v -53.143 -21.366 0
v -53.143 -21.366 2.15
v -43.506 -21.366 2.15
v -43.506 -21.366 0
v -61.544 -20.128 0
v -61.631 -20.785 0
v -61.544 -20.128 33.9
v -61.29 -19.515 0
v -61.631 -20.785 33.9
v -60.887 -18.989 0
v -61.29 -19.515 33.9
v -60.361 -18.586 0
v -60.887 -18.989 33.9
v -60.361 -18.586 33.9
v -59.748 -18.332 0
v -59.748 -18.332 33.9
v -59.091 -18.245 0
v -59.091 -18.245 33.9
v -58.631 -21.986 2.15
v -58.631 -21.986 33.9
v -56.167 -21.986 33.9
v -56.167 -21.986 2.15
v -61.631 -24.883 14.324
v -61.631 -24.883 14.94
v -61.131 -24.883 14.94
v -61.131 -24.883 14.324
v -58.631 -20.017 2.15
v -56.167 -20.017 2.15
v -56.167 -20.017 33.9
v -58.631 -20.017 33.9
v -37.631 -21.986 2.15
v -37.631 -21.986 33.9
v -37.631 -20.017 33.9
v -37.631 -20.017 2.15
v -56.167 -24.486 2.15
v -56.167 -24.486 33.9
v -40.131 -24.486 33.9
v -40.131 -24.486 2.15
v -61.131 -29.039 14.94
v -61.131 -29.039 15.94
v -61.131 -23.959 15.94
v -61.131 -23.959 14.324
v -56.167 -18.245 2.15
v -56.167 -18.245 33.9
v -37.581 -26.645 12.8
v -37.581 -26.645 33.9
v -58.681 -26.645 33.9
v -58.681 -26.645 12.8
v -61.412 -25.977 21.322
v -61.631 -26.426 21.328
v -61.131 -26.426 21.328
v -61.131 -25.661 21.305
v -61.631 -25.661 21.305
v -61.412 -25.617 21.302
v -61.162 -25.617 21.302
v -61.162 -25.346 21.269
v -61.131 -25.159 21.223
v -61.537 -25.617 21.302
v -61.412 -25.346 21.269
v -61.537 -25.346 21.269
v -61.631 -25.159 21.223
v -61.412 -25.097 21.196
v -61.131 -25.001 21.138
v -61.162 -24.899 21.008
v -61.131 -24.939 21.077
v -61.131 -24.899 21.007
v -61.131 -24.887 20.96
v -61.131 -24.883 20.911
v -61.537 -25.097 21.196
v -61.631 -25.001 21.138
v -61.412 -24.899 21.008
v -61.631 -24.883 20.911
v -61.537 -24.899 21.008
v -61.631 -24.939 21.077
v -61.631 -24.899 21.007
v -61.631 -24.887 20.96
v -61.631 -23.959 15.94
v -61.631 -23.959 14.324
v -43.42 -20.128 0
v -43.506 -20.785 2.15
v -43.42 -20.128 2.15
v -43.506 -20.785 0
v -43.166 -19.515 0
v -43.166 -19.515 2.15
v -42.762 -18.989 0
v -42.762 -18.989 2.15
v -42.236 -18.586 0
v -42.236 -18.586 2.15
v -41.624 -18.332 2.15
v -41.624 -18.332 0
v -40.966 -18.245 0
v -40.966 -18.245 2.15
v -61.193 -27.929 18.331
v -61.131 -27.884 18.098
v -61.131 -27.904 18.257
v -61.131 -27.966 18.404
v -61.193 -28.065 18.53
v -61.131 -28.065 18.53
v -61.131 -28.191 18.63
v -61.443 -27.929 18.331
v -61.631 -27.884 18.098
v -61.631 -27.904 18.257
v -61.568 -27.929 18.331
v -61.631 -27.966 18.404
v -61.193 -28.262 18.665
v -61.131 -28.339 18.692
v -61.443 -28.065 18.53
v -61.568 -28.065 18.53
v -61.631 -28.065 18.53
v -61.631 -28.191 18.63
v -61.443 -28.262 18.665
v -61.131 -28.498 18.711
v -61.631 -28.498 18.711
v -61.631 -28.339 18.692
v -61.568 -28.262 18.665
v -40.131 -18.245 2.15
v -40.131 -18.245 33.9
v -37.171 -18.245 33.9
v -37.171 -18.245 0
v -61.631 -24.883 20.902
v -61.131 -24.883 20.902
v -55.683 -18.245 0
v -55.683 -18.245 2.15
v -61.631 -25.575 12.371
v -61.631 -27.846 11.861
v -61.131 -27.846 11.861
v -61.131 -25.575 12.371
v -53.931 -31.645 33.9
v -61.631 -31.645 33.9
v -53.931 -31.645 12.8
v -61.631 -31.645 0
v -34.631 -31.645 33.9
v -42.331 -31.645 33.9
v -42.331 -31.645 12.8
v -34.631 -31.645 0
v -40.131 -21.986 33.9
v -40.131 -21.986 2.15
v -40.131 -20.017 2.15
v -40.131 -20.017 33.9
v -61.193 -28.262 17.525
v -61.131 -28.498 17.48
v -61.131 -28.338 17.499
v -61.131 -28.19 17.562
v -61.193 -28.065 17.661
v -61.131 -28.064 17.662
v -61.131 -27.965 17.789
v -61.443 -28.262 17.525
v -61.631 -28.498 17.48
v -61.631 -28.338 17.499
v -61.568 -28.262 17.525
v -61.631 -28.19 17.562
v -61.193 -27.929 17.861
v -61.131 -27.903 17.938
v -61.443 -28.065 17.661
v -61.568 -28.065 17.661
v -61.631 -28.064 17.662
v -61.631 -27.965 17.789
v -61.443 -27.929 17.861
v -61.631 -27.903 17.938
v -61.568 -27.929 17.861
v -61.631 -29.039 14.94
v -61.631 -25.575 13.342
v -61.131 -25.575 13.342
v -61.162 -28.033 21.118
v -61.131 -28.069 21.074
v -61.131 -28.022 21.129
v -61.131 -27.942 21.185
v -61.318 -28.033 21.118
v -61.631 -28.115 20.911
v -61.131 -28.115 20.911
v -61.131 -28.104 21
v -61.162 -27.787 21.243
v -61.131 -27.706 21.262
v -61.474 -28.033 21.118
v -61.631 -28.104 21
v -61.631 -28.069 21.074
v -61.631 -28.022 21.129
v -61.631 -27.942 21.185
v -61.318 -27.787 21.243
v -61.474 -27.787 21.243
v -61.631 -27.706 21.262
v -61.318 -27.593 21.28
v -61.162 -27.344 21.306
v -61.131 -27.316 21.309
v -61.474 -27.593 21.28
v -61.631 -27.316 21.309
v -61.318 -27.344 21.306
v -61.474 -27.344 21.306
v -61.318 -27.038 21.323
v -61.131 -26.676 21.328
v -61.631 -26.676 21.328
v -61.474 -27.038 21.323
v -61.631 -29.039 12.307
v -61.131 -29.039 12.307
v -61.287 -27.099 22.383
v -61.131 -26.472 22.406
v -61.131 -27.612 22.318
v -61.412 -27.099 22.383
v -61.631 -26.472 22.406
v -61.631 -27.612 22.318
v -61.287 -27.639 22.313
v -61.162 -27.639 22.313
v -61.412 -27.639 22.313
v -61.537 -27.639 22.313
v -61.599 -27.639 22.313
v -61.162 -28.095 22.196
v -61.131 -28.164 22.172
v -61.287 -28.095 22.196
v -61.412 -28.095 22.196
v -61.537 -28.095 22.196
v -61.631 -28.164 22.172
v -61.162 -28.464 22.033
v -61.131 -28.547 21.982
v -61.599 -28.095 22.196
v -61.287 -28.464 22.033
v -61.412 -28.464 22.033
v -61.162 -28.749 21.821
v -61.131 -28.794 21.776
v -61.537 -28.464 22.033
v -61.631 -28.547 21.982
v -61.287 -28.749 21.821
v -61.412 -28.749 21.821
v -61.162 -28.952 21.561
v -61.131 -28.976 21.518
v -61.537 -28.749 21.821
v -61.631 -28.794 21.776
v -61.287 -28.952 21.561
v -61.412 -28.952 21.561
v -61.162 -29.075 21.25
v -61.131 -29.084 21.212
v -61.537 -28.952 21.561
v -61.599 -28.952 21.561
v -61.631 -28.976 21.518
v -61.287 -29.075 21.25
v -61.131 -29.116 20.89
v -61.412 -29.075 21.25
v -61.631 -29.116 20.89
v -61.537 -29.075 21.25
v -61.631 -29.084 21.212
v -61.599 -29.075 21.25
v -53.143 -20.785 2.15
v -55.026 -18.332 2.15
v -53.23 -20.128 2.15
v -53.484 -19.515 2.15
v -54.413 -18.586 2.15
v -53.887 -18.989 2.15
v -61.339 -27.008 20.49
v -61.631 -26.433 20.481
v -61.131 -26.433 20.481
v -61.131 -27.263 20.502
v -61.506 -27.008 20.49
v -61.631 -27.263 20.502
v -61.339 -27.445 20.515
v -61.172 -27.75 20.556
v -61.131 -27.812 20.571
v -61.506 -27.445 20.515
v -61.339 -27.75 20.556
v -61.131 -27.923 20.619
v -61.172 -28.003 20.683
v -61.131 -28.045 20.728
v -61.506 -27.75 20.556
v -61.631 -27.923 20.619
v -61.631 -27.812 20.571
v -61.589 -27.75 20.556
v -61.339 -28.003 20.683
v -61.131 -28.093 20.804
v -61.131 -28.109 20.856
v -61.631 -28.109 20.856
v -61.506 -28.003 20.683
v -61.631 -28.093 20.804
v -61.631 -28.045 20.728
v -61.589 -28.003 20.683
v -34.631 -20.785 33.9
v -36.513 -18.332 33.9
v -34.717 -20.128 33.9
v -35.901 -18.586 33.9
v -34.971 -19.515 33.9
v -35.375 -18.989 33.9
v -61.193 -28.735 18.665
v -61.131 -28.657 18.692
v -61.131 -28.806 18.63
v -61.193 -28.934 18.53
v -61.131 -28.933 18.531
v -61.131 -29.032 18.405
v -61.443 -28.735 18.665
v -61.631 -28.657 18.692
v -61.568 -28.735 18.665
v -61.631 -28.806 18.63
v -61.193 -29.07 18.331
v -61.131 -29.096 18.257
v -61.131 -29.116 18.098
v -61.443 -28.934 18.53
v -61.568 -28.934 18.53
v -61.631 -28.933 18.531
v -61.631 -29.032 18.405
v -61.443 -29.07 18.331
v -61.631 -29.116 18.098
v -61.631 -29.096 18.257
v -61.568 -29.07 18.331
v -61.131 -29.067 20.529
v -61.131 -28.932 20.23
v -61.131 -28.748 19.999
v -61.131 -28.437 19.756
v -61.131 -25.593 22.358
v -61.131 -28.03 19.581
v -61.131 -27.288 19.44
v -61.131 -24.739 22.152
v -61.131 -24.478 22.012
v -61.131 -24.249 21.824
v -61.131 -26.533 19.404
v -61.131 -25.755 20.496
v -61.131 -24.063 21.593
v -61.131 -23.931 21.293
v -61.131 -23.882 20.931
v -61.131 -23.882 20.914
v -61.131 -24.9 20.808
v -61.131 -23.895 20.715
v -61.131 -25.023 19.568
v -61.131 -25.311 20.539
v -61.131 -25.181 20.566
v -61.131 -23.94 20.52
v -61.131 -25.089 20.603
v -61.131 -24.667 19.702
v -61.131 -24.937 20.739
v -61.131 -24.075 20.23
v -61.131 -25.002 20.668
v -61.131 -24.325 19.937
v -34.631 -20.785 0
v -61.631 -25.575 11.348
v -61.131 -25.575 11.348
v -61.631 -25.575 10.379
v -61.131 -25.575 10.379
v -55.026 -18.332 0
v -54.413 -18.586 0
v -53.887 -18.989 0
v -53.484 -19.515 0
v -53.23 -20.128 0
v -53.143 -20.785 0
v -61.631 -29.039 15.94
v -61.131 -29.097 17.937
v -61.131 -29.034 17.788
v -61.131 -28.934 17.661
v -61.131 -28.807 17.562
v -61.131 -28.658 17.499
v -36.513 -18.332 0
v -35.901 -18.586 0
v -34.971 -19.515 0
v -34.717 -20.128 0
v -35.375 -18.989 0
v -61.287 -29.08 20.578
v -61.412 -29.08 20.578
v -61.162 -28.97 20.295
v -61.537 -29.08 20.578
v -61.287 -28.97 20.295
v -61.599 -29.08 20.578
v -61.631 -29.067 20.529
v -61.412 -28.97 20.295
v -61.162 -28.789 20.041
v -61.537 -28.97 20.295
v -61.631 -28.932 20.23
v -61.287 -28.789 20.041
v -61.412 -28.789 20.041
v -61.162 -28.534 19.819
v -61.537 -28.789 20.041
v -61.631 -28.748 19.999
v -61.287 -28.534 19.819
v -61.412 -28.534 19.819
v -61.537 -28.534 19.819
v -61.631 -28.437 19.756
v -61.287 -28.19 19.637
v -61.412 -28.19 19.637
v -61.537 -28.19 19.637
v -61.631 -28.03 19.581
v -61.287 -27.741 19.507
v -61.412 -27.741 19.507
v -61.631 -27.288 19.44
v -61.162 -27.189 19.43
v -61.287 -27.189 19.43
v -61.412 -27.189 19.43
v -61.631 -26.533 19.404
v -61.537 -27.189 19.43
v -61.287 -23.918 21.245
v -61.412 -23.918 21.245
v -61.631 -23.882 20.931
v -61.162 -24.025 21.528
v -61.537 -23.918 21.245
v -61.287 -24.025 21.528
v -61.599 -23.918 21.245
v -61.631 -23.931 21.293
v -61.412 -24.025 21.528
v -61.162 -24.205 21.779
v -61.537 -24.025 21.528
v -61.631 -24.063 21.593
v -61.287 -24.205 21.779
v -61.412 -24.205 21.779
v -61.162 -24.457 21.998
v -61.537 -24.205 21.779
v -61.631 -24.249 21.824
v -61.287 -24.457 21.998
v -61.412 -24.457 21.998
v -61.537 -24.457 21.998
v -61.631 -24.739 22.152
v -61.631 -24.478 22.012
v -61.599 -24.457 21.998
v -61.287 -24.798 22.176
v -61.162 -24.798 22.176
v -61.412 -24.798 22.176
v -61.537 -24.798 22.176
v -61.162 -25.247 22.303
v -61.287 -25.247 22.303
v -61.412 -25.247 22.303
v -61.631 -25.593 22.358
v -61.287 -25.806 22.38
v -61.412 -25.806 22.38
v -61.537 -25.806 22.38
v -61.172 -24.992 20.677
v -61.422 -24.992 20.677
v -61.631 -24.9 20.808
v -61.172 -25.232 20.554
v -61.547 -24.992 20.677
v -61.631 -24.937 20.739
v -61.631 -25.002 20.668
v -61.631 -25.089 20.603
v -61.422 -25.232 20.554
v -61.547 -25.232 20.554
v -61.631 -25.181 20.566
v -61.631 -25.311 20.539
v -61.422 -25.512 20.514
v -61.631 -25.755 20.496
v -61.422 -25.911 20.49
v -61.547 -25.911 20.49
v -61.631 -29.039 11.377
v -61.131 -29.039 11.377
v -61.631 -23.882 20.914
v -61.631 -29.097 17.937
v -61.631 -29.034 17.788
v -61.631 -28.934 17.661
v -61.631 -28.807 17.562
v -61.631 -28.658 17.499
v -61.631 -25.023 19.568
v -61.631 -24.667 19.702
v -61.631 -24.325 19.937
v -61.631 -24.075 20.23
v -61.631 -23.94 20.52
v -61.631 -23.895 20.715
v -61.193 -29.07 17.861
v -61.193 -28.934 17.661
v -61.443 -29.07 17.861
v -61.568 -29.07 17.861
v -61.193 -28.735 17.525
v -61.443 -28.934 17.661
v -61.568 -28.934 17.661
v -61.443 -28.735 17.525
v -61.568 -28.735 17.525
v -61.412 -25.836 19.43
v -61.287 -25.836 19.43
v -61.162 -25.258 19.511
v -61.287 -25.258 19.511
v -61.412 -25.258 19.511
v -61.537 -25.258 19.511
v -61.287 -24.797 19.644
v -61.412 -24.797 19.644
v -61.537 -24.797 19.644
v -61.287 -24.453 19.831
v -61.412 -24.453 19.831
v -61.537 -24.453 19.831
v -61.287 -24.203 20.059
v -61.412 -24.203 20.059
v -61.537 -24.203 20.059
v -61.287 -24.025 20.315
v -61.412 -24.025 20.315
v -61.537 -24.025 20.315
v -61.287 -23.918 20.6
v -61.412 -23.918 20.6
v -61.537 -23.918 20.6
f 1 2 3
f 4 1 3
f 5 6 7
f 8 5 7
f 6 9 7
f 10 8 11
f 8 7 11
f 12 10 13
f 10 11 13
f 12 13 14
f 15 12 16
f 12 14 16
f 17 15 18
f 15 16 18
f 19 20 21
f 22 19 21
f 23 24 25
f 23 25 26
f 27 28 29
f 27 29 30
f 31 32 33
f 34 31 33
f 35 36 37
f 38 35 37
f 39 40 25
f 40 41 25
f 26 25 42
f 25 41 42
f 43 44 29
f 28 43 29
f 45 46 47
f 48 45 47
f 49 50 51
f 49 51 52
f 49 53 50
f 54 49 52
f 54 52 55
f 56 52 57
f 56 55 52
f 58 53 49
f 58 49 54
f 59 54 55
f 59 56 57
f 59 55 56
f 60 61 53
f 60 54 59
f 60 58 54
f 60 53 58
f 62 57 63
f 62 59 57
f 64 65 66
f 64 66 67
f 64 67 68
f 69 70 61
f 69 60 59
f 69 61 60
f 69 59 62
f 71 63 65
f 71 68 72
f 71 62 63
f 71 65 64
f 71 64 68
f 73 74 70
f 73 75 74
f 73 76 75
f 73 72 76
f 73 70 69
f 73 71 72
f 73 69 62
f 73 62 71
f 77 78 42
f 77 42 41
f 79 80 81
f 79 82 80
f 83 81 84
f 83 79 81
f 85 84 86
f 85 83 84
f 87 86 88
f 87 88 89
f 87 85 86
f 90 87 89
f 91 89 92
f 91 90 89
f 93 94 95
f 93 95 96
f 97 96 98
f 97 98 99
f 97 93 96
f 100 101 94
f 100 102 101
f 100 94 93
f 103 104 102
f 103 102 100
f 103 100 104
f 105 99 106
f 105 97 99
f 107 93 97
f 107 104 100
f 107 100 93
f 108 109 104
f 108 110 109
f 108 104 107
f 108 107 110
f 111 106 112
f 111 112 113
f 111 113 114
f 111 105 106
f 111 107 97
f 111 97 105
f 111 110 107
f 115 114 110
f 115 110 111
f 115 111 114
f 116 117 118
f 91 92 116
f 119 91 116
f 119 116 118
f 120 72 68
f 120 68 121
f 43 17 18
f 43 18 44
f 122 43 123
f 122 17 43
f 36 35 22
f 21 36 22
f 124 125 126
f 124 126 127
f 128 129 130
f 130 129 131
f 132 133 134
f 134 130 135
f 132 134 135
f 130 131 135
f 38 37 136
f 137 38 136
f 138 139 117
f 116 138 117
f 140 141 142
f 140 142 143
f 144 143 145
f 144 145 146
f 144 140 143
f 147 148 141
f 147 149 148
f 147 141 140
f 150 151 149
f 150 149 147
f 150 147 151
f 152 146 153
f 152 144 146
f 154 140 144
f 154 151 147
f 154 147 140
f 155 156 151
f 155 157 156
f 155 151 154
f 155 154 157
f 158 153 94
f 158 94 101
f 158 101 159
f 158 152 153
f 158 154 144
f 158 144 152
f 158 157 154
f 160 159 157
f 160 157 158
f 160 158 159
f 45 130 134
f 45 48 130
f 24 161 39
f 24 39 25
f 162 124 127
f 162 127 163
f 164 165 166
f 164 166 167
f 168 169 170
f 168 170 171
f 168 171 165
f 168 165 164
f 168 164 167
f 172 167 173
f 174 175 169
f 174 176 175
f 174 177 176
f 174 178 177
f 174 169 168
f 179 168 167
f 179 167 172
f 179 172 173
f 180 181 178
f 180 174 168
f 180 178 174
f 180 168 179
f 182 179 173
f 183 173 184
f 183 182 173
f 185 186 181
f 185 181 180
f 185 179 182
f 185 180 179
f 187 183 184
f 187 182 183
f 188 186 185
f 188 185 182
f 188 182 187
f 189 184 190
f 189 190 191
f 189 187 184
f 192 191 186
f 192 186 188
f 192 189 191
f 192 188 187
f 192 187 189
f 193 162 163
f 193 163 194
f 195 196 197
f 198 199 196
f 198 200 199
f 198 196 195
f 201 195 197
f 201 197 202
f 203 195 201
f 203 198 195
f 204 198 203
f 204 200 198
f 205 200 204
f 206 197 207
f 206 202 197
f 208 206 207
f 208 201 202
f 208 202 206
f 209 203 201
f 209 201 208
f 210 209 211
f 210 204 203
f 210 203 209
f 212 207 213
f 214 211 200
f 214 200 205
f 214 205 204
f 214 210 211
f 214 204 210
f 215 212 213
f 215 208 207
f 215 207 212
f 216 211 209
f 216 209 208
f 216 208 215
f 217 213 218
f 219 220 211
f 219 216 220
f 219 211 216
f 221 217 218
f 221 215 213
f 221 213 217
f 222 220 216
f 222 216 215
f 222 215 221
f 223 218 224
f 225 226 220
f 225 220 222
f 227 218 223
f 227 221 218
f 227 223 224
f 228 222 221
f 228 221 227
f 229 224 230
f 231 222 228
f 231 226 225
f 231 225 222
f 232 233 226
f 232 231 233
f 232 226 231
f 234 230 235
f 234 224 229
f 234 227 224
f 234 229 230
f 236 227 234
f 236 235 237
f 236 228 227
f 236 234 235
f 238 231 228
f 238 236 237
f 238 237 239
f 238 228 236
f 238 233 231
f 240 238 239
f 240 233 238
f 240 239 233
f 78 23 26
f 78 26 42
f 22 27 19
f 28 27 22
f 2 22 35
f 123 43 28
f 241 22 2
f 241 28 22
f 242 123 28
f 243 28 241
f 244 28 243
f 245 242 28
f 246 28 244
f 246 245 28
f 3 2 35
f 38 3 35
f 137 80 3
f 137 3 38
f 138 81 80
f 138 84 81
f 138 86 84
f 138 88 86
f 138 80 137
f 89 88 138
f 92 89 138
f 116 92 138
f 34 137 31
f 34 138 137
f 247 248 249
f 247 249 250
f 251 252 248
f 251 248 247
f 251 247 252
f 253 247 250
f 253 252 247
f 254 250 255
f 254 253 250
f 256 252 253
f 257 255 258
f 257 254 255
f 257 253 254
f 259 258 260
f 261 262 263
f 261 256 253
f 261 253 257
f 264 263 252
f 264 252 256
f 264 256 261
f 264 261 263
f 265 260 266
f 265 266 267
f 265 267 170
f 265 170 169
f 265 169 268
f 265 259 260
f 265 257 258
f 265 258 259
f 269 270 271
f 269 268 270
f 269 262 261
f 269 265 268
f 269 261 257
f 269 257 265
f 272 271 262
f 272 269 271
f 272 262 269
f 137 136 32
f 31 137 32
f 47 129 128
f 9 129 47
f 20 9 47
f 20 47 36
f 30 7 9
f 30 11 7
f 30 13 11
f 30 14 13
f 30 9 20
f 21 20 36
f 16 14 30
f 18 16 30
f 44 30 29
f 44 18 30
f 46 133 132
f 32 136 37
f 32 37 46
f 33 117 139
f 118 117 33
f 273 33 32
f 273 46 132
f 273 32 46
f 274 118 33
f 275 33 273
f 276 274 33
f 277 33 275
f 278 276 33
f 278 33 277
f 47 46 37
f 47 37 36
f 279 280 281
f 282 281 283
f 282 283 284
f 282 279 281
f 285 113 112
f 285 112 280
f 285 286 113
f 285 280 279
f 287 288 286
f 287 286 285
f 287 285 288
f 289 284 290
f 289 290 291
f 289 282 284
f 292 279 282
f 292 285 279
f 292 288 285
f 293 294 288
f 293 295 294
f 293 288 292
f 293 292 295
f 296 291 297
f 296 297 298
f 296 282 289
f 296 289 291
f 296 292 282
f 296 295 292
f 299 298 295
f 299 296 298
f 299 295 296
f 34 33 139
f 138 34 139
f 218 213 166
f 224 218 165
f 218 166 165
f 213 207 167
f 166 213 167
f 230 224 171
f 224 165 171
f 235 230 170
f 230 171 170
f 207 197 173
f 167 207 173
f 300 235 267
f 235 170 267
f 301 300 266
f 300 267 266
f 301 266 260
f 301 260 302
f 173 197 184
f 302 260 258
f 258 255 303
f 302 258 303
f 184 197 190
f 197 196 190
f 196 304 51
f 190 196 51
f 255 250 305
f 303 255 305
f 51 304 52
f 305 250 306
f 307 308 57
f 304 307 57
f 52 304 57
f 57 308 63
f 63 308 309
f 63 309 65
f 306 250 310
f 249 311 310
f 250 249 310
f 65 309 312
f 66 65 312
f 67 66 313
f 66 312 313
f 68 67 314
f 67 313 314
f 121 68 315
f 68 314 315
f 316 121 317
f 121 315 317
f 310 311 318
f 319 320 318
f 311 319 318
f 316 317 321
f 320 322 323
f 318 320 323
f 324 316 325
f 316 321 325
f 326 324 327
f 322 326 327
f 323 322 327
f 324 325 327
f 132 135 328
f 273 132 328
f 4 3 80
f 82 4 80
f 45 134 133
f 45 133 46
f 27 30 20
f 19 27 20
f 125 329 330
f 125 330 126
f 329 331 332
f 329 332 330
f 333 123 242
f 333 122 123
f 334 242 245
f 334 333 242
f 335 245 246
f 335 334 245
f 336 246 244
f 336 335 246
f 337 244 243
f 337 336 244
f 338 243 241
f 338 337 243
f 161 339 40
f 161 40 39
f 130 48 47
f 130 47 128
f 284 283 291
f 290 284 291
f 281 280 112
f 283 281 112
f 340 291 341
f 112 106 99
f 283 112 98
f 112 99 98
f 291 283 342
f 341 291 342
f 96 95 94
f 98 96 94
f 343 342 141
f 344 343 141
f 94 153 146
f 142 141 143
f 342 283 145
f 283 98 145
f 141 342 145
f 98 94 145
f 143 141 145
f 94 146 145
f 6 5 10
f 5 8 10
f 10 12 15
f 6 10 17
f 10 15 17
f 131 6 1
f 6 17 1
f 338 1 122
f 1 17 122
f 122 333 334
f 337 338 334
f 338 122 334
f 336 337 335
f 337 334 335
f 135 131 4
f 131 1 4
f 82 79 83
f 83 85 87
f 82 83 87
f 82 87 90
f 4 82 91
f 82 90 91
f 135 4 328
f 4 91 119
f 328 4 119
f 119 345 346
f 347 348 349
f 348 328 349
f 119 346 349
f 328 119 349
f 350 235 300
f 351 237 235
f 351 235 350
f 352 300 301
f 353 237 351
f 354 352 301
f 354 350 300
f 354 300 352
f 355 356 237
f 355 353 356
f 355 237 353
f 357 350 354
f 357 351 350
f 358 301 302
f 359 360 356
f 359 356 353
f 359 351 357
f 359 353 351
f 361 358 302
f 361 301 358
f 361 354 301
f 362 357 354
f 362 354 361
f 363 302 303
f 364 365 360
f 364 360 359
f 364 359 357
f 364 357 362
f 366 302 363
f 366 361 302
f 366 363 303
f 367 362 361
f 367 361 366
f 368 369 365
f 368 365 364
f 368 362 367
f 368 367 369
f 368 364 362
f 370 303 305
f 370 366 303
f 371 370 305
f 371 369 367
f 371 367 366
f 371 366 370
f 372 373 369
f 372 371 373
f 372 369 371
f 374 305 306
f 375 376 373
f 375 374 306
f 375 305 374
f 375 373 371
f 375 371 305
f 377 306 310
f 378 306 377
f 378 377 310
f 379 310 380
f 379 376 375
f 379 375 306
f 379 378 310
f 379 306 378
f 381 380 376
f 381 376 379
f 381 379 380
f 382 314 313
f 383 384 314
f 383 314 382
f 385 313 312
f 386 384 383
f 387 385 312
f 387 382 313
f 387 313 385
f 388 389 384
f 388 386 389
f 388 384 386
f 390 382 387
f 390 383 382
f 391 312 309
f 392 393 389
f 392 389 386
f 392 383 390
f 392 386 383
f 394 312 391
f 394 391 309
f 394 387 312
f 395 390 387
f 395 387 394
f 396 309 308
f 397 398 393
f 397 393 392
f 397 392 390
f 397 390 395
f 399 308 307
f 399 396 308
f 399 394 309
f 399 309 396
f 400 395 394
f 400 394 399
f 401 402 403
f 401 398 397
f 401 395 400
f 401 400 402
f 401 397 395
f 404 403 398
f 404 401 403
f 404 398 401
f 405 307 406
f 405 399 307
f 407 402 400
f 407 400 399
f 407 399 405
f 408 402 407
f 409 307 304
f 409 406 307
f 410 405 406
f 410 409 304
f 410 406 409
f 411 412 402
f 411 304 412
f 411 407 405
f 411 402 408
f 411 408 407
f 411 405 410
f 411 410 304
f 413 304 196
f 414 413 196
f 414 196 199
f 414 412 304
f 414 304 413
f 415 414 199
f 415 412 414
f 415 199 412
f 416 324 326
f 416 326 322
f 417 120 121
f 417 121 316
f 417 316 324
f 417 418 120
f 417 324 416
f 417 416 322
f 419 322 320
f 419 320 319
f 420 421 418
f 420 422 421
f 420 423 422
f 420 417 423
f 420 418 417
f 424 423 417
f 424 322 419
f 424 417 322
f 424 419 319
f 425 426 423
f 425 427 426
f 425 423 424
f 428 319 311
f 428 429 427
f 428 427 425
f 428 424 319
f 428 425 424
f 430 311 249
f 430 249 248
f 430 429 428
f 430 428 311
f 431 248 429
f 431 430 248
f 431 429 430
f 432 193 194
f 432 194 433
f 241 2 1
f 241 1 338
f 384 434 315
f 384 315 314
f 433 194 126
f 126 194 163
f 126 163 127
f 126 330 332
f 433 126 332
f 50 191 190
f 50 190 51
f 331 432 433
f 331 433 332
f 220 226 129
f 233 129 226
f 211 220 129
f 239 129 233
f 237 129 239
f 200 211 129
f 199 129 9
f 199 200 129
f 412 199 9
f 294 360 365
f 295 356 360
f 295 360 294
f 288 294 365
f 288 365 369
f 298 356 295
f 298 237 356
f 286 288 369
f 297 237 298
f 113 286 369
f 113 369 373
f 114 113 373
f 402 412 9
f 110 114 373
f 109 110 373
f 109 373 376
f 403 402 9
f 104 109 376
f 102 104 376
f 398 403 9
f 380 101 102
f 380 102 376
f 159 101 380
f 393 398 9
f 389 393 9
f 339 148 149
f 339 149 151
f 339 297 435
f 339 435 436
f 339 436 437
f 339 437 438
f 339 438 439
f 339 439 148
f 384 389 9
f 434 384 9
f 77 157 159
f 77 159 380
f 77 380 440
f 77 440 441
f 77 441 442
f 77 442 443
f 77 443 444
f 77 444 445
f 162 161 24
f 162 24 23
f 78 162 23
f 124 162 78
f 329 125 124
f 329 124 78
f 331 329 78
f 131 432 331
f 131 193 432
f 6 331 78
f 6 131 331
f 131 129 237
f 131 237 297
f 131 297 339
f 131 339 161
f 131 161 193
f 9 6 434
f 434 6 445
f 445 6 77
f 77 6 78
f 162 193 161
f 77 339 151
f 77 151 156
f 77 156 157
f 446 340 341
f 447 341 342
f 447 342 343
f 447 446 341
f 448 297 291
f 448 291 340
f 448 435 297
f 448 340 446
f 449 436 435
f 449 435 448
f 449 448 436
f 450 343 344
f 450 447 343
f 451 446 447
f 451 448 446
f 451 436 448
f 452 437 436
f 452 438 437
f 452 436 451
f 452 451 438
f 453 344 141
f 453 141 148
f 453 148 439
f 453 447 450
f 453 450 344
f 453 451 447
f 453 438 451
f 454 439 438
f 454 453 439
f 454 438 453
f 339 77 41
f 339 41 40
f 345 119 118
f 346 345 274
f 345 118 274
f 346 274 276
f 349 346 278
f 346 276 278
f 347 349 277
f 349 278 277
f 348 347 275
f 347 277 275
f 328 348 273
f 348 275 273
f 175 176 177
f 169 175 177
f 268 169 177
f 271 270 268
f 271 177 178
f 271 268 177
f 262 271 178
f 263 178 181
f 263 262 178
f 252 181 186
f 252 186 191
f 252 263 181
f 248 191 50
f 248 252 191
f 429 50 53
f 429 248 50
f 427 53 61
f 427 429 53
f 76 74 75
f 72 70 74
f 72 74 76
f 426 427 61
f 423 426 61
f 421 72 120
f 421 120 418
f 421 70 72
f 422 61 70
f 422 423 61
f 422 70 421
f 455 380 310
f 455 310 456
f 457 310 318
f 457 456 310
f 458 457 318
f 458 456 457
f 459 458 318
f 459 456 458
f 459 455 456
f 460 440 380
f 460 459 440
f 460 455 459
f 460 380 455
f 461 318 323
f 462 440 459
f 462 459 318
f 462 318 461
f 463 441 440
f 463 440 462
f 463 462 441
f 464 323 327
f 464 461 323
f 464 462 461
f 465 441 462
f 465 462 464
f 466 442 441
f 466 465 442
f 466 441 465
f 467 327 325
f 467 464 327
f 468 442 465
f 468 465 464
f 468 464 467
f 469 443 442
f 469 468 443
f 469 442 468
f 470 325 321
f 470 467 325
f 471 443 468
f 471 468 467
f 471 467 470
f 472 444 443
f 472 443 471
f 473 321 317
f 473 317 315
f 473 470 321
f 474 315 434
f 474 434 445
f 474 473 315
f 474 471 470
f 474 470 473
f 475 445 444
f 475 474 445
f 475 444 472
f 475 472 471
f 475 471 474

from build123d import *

# Parameters (mm, degrees)
SKETCH1_W           = 26.999946
SKETCH1_H           = 13.40000114
BOSS_EXTRUDE2_DEPTH = 33.90000078
FILLET2_R           = 2.54
FILLET6_R           = 2.54
CUT_EXTRUDE3_DEPTH  = 31.75
CUT_EXTRUDE4_DEPTH  = 21.10000098
SKETCH13_W          = 9.637018572
SKETCH13_H          = 3.12024758
CUT_EXTRUDE5_DEPTH  = 21.10000098
FILLET7_R           = 2.54
FILLET8_R           = 2.54
CUT_EXTRUDE6_DEPTH  = 0.5


with BuildPart() as part:
    # Sketch1 → Boss-Extrude2 (new body)
    with BuildSketch(Plane.XY):
        with Locations((-48.130528347, -24.945290526)):
            Rectangle(SKETCH1_W, SKETCH1_H)
    extrude(amount=BOSS_EXTRUDE2_DEPTH)

    # Fillet2
    fillet2_edges = [part.edges().sort_by_distance(p)[0] for p in [
        (-61.630501347, -18.245289956, 16.95000039),
    ]]
    fillet(fillet2_edges, radius=FILLET2_R)

    # Fillet6
    fillet6_edges = [part.edges().sort_by_distance(p)[0] for p in [
        (-34.630555347, -18.245289956, 16.95000039),
    ]]
    fillet(fillet6_edges, radius=FILLET6_R)

    # Sketch5 → Cut-Extrude3 (cut)
    with BuildSketch(Plane.XY.offset(33.90000078)):
        Polygon((-40.130518947, -18.245289956), (-56.166507941, -18.245289956), (-56.166507941, -20.01667393), (-58.630527667, -20.01667393), (-58.630527667, -21.985785037), (-56.166507941, -21.985785037), (-56.166507941, -24.485785117), (-40.130518947, -24.485785117), (-40.130518947, -21.985785037), (-37.630529027, -21.985785037), (-37.630529027, -20.01667393), (-40.130518947, -20.01667393), align=None)
    extrude(amount=-CUT_EXTRUDE3_DEPTH, mode=Mode.SUBTRACT)

    # Sketch5<10> → Cut-Extrude4 (cut)
    with BuildSketch(Plane.XY.offset(33.90000078)):
        Polygon((-37.580528365, -26.645301096), (-58.680528329, -26.645301096), (-53.930516747, -31.645291096), (-42.330539947, -31.645291096), align=None)
    extrude(amount=-CUT_EXTRUDE4_DEPTH, mode=Mode.SUBTRACT)

    # Sketch13 → Cut-Extrude5 (cut)
    with BuildSketch(Plane.XY.offset(2.15000078)):
        with Locations((-48.324844449, -19.805413746)):
            Rectangle(SKETCH13_W, SKETCH13_H)
    extrude(amount=-CUT_EXTRUDE5_DEPTH, mode=Mode.SUBTRACT)

    # Fillet7
    fillet7_edges = [part.edges().sort_by_distance(p)[0] for p in [
        (-53.143353735, -18.245289956, 1.07500039),
    ]]
    fillet(fillet7_edges, radius=FILLET7_R)

    # Fillet8
    fillet8_edges = [part.edges().sort_by_distance(p)[0] for p in [
        (-43.506335163, -18.245289956, 1.07500039),
    ]]
    fillet(fillet8_edges, radius=FILLET8_R)

    # Sketch14 → Cut-Extrude6 (cut)
    # profile 1 of 4: a face of its own
    with BuildSketch(Plane.ZY.offset(61.630501347)):
        Polygon((10.379133327, -25.575254401), (11.348470448, -25.575254401), (11.860799994, -27.845860462), (12.370724236, -25.575254401), (13.34246666, -25.575254401), (12.306983706, -29.038890765), (11.377334084, -29.038890765), align=None)
    # profile 2 of 4: a face of its own
    with BuildSketch(Plane.ZY.offset(61.630501347)):
        Polygon((15.940193933, -29.038890765), (14.939587872, -29.038890765), (14.939587872, -24.882527129), (14.323830297, -24.882527129), (14.323830297, -23.958890765), (15.940193933, -23.958890765), align=None)
    # profile 3 of 4: a face of its own
    with BuildSketch(Plane.ZY.offset(61.630501347)):
        with BuildLine():
            add(Edge.make_bspline(
                [(18.097750751, -27.88434531), (18.138079406, -27.886280917), (18.217803819, -27.890107354), (18.332685422, -27.925110839), (18.438493733, -27.983109537), (18.53145822, -28.062297179), (18.611571397, -28.154662261), (18.668745196, -28.260613669), (18.705969735, -28.375771267), (18.709369212, -28.456515949), (18.711103024, -28.497697583)],
                knots=[0, 0, 0, 0, 1.003562546, 1.983910333, 2.963493518, 3.99241943, 5.013694866, 5.993278051, 6.976525906, 8, 8, 8, 8], degree=3))
            add(Edge.make_bspline(
                [(18.711103024, -28.497697583), (18.709332109, -28.538870465), (18.705843349, -28.619982384), (18.66877096, -28.735949334), (18.61158104, -28.843047203), (18.531851067, -28.936625461), (18.438485669, -29.015968524), (18.332472116, -29.073558386), (18.218032192, -29.110465638), (18.138116937, -29.114049971), (18.097750751, -29.115860462)],
                knots=[0, 0, 0, 0, 1.019791572, 2.009022661, 2.993832134, 4.019055907, 5.04427968, 6.020338265, 7.000048334, 8, 8, 8, 8], degree=3))
            add(Edge.make_bspline(
                [(18.097750751, -29.115860462), (18.056577634, -29.114089682), (17.975465252, -29.110601189), (17.859501693, -29.073526848), (17.7523909, -29.016344367), (17.658862826, -28.936585509), (17.579103967, -28.843057434), (17.521921486, -28.735946641), (17.484847145, -28.619983083), (17.481358652, -28.5388707), (17.479587872, -28.497697583)],
                knots=[0, 0, 0, 0, 1.014956344, 1.999497103, 2.979637211, 4, 5.020362789, 6.000502897, 6.985043656, 8, 8, 8, 8], degree=3))
            add(Edge.make_bspline(
                [(17.479587872, -28.497697583), (17.481321547, -28.456515711), (17.484720757, -28.375770564), (17.52194724, -28.260616349), (17.579113639, -28.15465206), (17.659255671, -28.062337208), (17.752381665, -27.98273207), (17.859290503, -27.925141489), (17.975692779, -27.889977159), (18.056615376, -27.886243328), (18.097750751, -27.88434531)],
                knots=[0, 0, 0, 0, 1.018600418, 1.99716615, 2.972084663, 3.988496894, 5.012523168, 5.996182348, 6.981399582, 8, 8, 8, 8], degree=3))
        make_face()
    # profile 4 of 4: a face of its own
    with BuildSketch(Plane.ZY.offset(61.630501347)):
        with BuildLine():
            add(Edge.make_bspline(
                [(20.931197721, -23.881921068), (20.985056731, -23.883226878), (21.090720928, -23.885788702), (21.244769307, -23.9152334), (21.391323862, -23.959060405), (21.53023961, -24.022398267), (21.660121307, -24.105005226), (21.782851726, -24.204293049), (21.895973442, -24.322648707), (22.003567328, -24.45799688), (22.099228141, -24.617851329), (22.181436149, -24.803459821), (22.252687382, -25.015027832), (22.307614559, -25.254546124), (22.351696434, -25.520863888), (22.383569998, -25.814341296), (22.402798135, -26.134628461), (22.404674049, -26.356949463), (22.405648478, -26.472432432)],
                knots=[0, 0, 0, 0, 0.771332613, 1.513251727, 2.240597296, 2.960866685, 3.694499943, 4.442341285, 5.21879767, 6.037573001, 6.916942947, 7.881745747, 8.943344806, 10.113149818, 11.401222121, 12.812386846, 14.344218373, 16, 16, 16, 16], degree=3))
            add(Edge.make_bspline(
                [(22.405648478, -26.472432432), (22.404396907, -26.580284923), (22.401971255, -26.789312273), (22.386138652, -27.092435851), (22.355273116, -27.373547315), (22.317074669, -27.634146245), (22.264120154, -27.872655129), (22.201185652, -28.090561812), (22.12533943, -28.286671889), (22.038100385, -28.462107021), (21.937763793, -28.616445143), (21.825408362, -28.750170898), (21.700591375, -28.863457877), (21.56272832, -28.955830715), (21.412541396, -29.02928702), (21.248699637, -29.078338647), (21.073649557, -29.111564085), (20.95260947, -29.114400499), (20.890307569, -29.115860462)],
                knots=[0, 0, 0, 0, 1.50870248, 2.923994413, 4.243638183, 5.463389085, 6.60625131, 7.658463092, 8.633168196, 9.543499728, 10.394265693, 11.20201185, 11.98019515, 12.743837022, 13.516301738, 14.309116721, 15.129666499, 16, 16, 16, 16], degree=3))
            add(Edge.make_bspline(
                [(20.890307569, -29.115860462), (20.836888052, -29.113860582), (20.731792627, -29.109926098), (20.577605949, -29.08328872), (20.431278661, -29.037401328), (20.292554261, -28.972494441), (20.161048263, -28.890514566), (20.037037811, -28.789829672), (19.923549635, -28.668805966), (19.813059733, -28.532748539), (19.714981126, -28.371841479), (19.631556022, -28.185280667), (19.561076018, -27.972767479), (19.502614059, -27.735154885), (19.459074354, -27.470874255), (19.427488834, -27.181406496), (19.406231962, -26.86561241), (19.404651566, -26.646453379), (19.403830297, -26.532565007)],
                knots=[0, 0, 0, 0, 0.767064978, 1.509093008, 2.239234133, 2.962992384, 3.702604544, 4.459666546, 5.24957235, 6.081234809, 6.972826761, 7.946696209, 9.00988814, 10.184161048, 11.457135305, 12.853252474, 14.364758447, 16, 16, 16, 16], degree=3))
            add(Edge.make_bspline(
                [(19.403830297, -26.532565007), (19.405343313, -26.41147649), (19.408246136, -26.179160165), (19.4265832, -25.845544201), (19.460122793, -25.541240094), (19.505983736, -25.265890236), (19.565277062, -25.019515889), (19.638180282, -24.802581782), (19.724031949, -24.614256394), (19.824861367, -24.454207089), (19.9380296, -24.320016414), (20.055058691, -24.20194265), (20.181610946, -24.104387273), (20.313449939, -24.022069601), (20.453651131, -23.959560534), (20.601126046, -23.914985992), (20.755273234, -23.885984152), (20.860912228, -23.883286137), (20.9143606, -23.881921068)],
                knots=[0, 0, 0, 0, 1.696240751, 3.25435002, 4.678185503, 5.982669853, 7.1621562, 8.224110319, 9.183849441, 10.054717565, 10.864316389, 11.638635857, 12.3788924, 13.097379862, 13.811243946, 14.5217872, 15.252093721, 16, 16, 16, 16], degree=3))
            Line((20.9143606, -23.881921068), (20.931197721, -23.881921068))
        make_face()
        with BuildLine():
            add(Edge.make_bspline(
                [(20.902334084, -24.882527129), (20.875471577, -24.884870991), (20.820892064, -24.889633275), (20.742813172, -24.929610862), (20.672853012, -24.993841058), (20.61302329, -25.063342849), (20.574863691, -25.147278796), (20.549528727, -25.242115173), (20.52960129, -25.366715462), (20.511817776, -25.521619069), (20.497717132, -25.706149249), (20.488816901, -25.921545642), (20.482842083, -26.166925762), (20.481902018, -26.34093843), (20.481406054, -26.432744932)],
                knots=[0, 0, 0, 0, 0.555089739, 1.127836905, 1.776342633, 2.521778993, 3.009072645, 3.674991373, 4.552665314, 5.624338466, 6.908813976, 8.390474787, 10.095668052, 12, 12, 12, 12], degree=3))
            add(Edge.make_bspline(
                [(20.481406054, -26.432744932), (20.481945816, -26.534170548), (20.482965706, -26.725816263), (20.488362251, -26.996086799), (20.499121627, -27.232267848), (20.513254629, -27.434806561), (20.530099199, -27.603936191), (20.551916511, -27.739197856), (20.577922908, -27.841013489), (20.617450756, -27.929377897), (20.678503158, -28.001478729), (20.750060893, -28.066794249), (20.828707046, -28.108210985), (20.883868692, -28.112946479), (20.910752645, -28.115254401)],
                knots=[0, 0, 0, 0, 1.953528676, 3.691231172, 5.206184117, 6.506653282, 7.601487946, 8.478619439, 9.143630876, 9.62034953, 10.329399348, 10.942446392, 11.484583531, 12, 12, 12, 12], degree=3))
            add(Edge.make_bspline(
                [(20.910752645, -28.115254401), (20.93049651, -28.114439123), (20.969437533, -28.112831143), (21.024801567, -28.096989041), (21.074883049, -28.070519149), (21.120060306, -28.034248702), (21.158040543, -27.985579189), (21.193751652, -27.929498826), (21.220495823, -27.86133495), (21.244716879, -27.783813426), (21.265207075, -27.693334798), (21.280994345, -27.589547907), (21.295689702, -27.471659753), (21.30728519, -27.340070415), (21.316828242, -27.193711688), (21.324150821, -27.033737078), (21.327370131, -26.859299015), (21.327831892, -26.738620097), (21.328072721, -26.675680538)],
                knots=[0, 0, 0, 0, 0.582331179, 1.14853764, 1.683660151, 2.247880787, 2.84543266, 3.499589125, 4.205728503, 4.99995591, 5.899311367, 6.943075691, 8.10079055, 9.409103481, 10.845466559, 12.434274638, 14.140311608, 16, 16, 16, 16], degree=3))
            Line((21.328072721, -26.675680538), (21.328072721, -26.425529023))
            add(Edge.make_bspline(
                [(21.328072721, -26.425529023), (21.327964777, -26.346952757), (21.327759328, -26.197400118), (21.322924549, -25.984090607), (21.31500423, -25.793187971), (21.30274379, -25.624401554), (21.28904144, -25.477487909), (21.2715248, -25.352135589), (21.250379714, -25.248857772), (21.22658848, -25.165182117), (21.197236366, -25.097740853), (21.167163941, -25.040324075), (21.132336877, -24.992213258), (21.095737604, -24.951666647), (21.053429134, -24.921492247), (21.009472024, -24.89753721), (20.960631425, -24.885816856), (20.927636139, -24.88364067), (20.910752645, -24.882527129)],
                knots=[0, 0, 0, 0, 2.191769581, 4.171551293, 5.951267545, 7.520785486, 8.891616004, 10.066614677, 11.049135632, 11.831021187, 12.487359542, 13.097797181, 13.634666562, 14.140969097, 14.612885563, 15.077996148, 15.528216039, 16, 16, 16, 16], degree=3))
            Line((20.910752645, -24.882527129), (20.902334084, -24.882527129))
        make_face(mode=Mode.SUBTRACT)
    extrude(amount=-CUT_EXTRUDE6_DEPTH, mode=Mode.SUBTRACT)


solid = part.part
